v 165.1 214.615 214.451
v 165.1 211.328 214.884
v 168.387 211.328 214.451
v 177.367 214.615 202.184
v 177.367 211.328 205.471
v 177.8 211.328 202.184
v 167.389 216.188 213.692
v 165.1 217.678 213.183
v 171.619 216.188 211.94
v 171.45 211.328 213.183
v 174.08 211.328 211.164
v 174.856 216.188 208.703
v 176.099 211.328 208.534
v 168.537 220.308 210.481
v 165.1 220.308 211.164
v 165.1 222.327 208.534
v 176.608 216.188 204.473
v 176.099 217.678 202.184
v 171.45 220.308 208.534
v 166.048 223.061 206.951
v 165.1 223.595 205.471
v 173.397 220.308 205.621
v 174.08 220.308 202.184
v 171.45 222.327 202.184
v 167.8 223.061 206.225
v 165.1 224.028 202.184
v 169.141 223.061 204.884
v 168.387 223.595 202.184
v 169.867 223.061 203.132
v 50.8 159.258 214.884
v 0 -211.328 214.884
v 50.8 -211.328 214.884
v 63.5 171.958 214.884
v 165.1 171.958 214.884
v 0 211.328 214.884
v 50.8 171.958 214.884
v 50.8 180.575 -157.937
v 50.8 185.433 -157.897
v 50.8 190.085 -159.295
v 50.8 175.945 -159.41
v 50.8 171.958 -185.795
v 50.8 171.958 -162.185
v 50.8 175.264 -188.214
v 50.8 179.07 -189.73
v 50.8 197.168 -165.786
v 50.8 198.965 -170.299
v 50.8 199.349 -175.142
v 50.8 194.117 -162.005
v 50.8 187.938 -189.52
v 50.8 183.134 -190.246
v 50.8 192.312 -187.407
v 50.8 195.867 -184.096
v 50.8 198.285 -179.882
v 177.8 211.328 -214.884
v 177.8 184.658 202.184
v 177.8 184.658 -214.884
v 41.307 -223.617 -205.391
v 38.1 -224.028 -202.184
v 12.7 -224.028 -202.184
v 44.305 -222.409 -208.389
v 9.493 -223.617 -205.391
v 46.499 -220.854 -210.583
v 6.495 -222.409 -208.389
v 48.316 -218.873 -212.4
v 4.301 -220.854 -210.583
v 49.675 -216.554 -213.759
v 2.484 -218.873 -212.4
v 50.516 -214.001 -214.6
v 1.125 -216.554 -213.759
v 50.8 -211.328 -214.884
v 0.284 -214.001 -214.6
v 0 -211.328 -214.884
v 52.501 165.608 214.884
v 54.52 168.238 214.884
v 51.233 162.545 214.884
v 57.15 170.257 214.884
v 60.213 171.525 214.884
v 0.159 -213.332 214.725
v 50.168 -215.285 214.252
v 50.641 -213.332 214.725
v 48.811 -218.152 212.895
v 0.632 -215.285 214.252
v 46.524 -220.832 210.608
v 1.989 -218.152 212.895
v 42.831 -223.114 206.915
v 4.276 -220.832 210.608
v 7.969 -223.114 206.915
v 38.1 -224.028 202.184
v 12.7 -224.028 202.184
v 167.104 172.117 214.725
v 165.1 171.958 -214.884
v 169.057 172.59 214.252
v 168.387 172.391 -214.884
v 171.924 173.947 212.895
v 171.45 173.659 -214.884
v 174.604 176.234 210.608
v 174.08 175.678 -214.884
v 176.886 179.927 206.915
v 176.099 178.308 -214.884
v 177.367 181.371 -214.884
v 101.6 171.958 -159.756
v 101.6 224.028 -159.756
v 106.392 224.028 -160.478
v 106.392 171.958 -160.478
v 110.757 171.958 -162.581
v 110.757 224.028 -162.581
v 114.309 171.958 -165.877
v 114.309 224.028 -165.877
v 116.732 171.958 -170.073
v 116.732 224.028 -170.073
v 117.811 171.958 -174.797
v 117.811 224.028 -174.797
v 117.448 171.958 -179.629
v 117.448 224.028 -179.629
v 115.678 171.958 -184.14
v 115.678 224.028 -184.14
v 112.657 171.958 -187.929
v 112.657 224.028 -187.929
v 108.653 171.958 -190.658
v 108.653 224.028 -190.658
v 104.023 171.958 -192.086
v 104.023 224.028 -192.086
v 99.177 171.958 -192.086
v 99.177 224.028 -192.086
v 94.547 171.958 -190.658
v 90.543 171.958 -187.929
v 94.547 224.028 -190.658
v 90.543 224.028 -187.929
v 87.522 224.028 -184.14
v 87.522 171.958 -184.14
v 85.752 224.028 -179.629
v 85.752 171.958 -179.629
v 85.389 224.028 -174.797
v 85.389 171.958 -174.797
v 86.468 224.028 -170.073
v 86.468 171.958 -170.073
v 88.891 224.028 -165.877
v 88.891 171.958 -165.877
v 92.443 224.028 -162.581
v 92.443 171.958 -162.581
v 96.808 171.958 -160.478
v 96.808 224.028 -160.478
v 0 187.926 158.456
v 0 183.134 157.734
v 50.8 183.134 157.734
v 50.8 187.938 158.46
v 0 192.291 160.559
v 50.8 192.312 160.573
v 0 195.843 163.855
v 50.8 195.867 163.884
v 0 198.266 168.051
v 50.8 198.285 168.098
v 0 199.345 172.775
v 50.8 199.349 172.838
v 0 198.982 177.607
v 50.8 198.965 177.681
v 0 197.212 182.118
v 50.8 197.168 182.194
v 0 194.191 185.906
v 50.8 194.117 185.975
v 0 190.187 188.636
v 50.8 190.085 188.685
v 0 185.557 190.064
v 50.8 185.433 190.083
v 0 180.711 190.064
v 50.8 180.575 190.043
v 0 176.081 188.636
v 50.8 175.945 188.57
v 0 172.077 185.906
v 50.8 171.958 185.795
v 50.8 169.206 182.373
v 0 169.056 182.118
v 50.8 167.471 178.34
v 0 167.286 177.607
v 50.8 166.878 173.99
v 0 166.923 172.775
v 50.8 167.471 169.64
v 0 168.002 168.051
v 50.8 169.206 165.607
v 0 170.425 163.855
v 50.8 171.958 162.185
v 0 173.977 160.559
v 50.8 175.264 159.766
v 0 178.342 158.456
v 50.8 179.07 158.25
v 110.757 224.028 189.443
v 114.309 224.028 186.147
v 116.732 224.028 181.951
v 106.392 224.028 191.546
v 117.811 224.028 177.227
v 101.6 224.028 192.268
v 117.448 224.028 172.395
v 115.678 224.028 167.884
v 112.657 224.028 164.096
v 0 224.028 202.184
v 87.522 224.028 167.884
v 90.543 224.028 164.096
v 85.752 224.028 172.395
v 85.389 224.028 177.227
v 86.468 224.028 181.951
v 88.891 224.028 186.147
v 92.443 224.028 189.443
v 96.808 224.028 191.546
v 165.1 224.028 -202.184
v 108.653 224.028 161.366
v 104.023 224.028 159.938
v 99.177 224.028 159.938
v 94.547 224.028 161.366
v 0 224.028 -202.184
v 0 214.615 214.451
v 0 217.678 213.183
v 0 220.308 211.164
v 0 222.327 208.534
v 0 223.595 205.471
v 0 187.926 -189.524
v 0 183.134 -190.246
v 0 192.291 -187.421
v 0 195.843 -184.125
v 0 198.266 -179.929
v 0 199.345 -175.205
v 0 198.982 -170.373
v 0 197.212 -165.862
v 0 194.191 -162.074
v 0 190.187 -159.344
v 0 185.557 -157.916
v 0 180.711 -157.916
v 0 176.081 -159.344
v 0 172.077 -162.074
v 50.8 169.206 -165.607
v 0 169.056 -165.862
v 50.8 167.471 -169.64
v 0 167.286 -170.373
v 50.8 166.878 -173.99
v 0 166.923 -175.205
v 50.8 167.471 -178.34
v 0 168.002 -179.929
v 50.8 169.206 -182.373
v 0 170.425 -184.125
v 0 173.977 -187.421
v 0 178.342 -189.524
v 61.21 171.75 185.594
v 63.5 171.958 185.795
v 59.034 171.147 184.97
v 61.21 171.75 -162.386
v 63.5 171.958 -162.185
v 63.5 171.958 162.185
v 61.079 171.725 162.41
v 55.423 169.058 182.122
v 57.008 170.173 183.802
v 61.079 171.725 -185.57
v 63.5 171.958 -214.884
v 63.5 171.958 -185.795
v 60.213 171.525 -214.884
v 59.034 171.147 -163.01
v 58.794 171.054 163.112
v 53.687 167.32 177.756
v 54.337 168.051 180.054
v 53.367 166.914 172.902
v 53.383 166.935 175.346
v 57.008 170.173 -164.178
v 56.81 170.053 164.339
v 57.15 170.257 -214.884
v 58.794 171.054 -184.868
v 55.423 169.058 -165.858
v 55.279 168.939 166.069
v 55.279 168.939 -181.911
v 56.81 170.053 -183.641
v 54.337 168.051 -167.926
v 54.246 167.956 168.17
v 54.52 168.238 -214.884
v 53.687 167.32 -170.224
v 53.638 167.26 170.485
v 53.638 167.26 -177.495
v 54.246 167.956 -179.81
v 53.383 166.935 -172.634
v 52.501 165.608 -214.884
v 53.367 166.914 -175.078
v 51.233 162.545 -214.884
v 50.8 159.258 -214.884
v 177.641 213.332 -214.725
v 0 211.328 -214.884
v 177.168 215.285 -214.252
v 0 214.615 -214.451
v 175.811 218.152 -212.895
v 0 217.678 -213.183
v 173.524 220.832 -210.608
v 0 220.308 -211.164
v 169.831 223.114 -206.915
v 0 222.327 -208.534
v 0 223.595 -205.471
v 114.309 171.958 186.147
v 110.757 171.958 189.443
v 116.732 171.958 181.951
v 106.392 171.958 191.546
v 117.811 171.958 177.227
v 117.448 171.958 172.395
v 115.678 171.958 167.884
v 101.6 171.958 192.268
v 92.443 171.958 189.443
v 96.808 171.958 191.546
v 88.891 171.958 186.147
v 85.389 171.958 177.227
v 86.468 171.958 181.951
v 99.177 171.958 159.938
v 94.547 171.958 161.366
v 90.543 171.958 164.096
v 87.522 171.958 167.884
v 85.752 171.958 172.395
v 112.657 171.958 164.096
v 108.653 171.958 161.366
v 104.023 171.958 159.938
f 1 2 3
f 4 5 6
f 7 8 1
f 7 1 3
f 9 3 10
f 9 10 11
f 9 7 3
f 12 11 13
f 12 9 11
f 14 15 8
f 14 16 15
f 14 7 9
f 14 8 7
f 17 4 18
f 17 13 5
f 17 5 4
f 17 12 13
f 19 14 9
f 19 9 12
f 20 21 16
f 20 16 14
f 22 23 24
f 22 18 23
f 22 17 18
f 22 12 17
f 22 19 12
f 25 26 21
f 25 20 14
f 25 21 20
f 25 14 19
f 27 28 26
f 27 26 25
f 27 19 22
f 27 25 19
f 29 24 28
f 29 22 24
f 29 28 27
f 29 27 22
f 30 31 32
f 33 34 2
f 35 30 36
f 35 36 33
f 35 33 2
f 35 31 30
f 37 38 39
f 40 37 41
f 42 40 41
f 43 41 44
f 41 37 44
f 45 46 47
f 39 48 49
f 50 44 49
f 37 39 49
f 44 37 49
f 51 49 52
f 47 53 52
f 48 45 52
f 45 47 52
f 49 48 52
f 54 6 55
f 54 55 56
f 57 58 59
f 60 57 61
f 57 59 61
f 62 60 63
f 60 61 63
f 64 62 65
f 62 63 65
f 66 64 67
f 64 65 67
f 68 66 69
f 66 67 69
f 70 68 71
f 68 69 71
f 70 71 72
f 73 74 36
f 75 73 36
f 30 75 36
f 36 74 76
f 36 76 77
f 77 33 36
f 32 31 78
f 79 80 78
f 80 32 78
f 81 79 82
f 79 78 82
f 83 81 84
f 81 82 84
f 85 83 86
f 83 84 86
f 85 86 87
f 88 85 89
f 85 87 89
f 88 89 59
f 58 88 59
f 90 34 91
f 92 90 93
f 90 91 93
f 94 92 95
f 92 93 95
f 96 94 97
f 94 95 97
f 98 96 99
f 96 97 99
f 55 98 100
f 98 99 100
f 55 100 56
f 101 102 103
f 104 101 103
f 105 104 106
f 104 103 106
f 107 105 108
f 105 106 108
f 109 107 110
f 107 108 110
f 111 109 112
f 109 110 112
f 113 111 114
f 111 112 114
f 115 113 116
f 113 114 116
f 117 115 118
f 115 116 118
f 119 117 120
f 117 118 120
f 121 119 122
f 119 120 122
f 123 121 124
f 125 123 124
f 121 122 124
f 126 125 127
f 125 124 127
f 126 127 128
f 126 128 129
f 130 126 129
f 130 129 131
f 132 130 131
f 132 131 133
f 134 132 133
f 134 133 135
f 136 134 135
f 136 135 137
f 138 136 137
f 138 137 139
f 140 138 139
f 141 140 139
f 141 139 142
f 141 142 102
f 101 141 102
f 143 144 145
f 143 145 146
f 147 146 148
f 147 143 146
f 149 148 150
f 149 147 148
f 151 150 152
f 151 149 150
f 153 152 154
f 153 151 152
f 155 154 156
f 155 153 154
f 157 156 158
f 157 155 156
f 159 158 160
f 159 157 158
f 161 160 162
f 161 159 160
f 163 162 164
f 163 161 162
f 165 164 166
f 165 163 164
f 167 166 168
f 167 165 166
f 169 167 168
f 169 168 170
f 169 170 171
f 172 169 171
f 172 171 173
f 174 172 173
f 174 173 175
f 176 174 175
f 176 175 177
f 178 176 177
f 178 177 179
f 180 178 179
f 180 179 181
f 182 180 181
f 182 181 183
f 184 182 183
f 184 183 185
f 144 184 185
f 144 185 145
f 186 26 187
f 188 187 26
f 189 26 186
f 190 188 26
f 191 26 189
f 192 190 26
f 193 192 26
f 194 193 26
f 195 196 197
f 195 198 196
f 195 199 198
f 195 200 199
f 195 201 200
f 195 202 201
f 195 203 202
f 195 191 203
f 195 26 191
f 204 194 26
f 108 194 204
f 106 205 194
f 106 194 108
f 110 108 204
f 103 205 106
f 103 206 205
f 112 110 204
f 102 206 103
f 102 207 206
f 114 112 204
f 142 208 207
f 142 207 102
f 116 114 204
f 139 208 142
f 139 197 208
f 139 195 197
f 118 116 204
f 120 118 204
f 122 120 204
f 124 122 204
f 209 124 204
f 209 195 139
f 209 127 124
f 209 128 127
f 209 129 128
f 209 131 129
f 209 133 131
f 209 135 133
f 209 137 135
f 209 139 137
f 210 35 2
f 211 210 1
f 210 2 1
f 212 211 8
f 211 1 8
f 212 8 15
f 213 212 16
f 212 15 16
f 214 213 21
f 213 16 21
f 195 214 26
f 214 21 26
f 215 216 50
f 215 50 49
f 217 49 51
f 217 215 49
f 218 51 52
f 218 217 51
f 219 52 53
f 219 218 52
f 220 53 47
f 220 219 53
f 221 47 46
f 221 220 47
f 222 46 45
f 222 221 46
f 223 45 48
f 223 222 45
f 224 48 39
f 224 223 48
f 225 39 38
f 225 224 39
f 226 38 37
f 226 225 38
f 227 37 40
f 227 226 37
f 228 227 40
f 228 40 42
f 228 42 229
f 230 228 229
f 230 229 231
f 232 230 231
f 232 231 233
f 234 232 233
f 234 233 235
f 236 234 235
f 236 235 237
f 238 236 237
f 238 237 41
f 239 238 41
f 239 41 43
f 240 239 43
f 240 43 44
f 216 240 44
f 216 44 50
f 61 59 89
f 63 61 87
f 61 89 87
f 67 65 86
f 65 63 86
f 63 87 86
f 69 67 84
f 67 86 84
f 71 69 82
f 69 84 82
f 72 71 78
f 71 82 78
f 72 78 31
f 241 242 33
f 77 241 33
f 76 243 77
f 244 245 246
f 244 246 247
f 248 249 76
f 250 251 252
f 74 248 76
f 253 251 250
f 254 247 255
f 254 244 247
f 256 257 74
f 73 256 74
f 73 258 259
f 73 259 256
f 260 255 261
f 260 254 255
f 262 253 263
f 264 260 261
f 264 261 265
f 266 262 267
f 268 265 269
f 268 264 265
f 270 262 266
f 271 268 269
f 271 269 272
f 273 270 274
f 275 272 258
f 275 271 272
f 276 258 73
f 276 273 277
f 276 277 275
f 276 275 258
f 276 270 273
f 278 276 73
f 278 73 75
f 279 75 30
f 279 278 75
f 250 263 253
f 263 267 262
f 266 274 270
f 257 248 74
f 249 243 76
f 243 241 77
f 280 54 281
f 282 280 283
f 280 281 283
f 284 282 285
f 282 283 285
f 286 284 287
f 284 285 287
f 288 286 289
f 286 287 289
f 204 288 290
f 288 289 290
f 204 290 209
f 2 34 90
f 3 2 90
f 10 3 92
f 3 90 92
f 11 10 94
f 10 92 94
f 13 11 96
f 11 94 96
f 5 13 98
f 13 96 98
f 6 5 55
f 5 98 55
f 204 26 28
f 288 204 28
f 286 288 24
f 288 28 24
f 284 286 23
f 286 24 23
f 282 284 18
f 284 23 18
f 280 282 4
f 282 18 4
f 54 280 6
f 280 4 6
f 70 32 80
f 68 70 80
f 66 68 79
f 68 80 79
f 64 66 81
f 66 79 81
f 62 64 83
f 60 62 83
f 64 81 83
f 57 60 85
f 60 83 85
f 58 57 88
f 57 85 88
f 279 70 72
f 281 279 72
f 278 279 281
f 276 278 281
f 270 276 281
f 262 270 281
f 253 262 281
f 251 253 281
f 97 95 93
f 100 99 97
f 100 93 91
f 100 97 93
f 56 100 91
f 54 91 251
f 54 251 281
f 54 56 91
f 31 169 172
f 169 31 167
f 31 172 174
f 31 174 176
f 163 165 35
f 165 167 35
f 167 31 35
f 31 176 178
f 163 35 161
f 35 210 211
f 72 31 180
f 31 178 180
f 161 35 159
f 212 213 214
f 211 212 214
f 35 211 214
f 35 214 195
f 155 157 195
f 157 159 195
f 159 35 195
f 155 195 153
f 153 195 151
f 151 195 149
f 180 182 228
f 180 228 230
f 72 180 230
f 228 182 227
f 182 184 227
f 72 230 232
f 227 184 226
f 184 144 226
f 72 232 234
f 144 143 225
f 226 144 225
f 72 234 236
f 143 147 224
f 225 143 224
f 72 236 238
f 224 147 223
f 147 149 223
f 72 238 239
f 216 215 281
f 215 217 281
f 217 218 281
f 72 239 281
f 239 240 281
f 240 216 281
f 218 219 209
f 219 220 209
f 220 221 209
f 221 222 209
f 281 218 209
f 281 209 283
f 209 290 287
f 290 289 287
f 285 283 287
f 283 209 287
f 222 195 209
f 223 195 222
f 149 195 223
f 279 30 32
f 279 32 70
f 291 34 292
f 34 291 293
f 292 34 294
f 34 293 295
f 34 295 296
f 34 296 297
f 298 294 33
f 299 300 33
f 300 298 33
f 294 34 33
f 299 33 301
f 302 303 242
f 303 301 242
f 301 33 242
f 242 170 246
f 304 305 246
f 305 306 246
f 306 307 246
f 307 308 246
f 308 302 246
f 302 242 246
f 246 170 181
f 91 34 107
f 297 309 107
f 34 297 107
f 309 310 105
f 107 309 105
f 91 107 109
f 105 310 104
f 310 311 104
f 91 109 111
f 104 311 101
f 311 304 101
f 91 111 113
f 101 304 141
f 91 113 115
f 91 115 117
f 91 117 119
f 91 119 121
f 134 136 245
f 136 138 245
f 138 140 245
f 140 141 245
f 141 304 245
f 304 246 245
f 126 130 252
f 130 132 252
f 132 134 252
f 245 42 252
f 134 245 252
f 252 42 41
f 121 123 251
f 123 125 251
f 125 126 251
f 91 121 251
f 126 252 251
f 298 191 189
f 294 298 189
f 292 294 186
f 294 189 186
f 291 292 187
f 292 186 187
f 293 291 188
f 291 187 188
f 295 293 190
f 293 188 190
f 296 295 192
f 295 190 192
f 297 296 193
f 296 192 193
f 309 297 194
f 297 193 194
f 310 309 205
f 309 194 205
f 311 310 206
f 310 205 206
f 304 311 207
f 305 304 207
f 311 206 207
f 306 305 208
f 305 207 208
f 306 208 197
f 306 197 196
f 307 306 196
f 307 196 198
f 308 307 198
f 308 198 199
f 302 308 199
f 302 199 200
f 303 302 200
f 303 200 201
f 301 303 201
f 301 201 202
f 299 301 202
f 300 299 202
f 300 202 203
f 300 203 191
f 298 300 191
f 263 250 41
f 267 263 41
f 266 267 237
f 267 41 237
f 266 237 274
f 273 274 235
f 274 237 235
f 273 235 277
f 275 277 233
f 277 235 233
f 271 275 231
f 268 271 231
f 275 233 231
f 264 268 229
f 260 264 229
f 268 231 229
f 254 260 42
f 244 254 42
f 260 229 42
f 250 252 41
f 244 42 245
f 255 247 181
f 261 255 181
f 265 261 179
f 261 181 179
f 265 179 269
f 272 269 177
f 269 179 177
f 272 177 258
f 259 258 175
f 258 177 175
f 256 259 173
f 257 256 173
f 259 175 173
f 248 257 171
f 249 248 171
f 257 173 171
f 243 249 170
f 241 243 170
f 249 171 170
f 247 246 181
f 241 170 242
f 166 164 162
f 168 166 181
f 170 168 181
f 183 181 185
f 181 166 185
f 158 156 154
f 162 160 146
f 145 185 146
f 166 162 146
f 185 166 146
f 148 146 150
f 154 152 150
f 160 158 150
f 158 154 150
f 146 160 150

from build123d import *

# Parameters (mm, degrees)
SKETCH1_W           = 429.768
SKETCH1_H           = 448.056
SKETCH1_R           = 16.256
BOSS_EXTRUDE1_DEPTH = 50.8
SKETCH2_W           = 429.768
SKETCH2_H           = 52.07
BOSS_EXTRUDE2_DEPTH = 127
SKETCH3_R           = 16.256
CUT_EXTRUDE1_DEPTH  = 76.2
FILLET1_R           = 12.7


with BuildPart() as part:
    # Sketch1 → Boss-Extrude1 (new body)
    with BuildSketch(Plane(origin=(0, 0, 0), x_dir=(0, 0, -1), z_dir=(1, 0, 0))):
        Rectangle(SKETCH1_W, SKETCH1_H)
        with Locations((-173.99, 183.134)):
            Circle(SKETCH1_R, mode=Mode.SUBTRACT)
        with Locations((173.99, 183.134)):
            Circle(SKETCH1_R, mode=Mode.SUBTRACT)
    extrude(amount=BOSS_EXTRUDE1_DEPTH)

    # Sketch2 → Boss-Extrude2 (add)
    with BuildSketch(Plane(origin=(50.8, 0, 0), x_dir=(0, 0, -1), z_dir=(1, 0, 0))):
        with Locations((0, 197.993)):
            Rectangle(SKETCH2_W, SKETCH2_H)
    extrude(amount=BOSS_EXTRUDE2_DEPTH)

    # Sketch3 → Cut-Extrude1 (cut)
    with BuildSketch(Plane(origin=(0, 224.028, 0), x_dir=(1, 0, 0), z_dir=(0, 1, 0))):
        with Locations(Location((101.6, 176.012040492, 0), (0, 0, 270))):
            Circle(SKETCH3_R)
        with Locations(Location((101.6, -176.012040492, 0), (0, 0, 270))):
            Circle(SKETCH3_R)
    extrude(amount=-CUT_EXTRUDE1_DEPTH, mode=Mode.SUBTRACT)

    # Fillet1
    # the kernel refuses this fillet: 12.7 mm, written as the material it adds along each edge
    with BuildSketch(Plane(origin=(50.8, 171.958, -214.884), x_dir=(0, -1, 0), z_dir=(0, 0, 1))) as fillet1_piece_1_section:
        with BuildLine():
            CenterArc((FILLET1_R, FILLET1_R), FILLET1_R, 180, 90)
            Line((0, FILLET1_R), (0, 0))
            Line((0, 0), (FILLET1_R, 0))
        make_face()
    fillet1_piece_1 = extrude(amount=60.839146761, mode=Mode.PRIVATE)
    fillet1_piece_1 = fillet1_piece_1 - Plane(origin=(53.390848129, 183.134, -173.99), x_dir=(0, 0, -1), z_dir=(-1, 0, 0)) * Cylinder(16.256, 173, mode=Mode.PRIVATE)
    add(fillet1_piece_1)
    with BuildSketch(Plane(origin=(50.8, 171.958, -193.935146761), x_dir=(0, -1, 0), z_dir=(0, 0, 1))) as fillet1_piece_2_section:
        with BuildLine():
            CenterArc((FILLET1_R, FILLET1_R), FILLET1_R, 180, 90)
            Line((0, FILLET1_R), (0, 0))
            Line((0, 0), (FILLET1_R, 0))
        make_face()
    fillet1_piece_2 = extrude(amount=387.870293522, mode=Mode.PRIVATE)
    fillet1_piece_2 = fillet1_piece_2 - Plane(origin=(53.573862422, 183.134, 173.99), x_dir=(0, 0, -1), z_dir=(-1, 0, 0)) * Cylinder(16.256, 827, mode=Mode.PRIVATE)
    fillet1_piece_2 = fillet1_piece_2 - Plane(origin=(53.573862422, 183.134, -173.99), x_dir=(0, 0, -1), z_dir=(-1, 0, 0)) * Cylinder(16.256, 827, mode=Mode.PRIVATE)
    add(fillet1_piece_2)
    with BuildSketch(Plane(origin=(50.8, 171.958, 154.044853239), x_dir=(0, -1, 0), z_dir=(0, 0, 1))) as fillet1_piece_3_section:
        with BuildLine():
            CenterArc((FILLET1_R, FILLET1_R), FILLET1_R, 180, 90)
            Line((0, FILLET1_R), (0, 0))
            Line((0, 0), (FILLET1_R, 0))
        make_face()
    fillet1_piece_3 = extrude(amount=60.839146761, mode=Mode.PRIVATE)
    fillet1_piece_3 = fillet1_piece_3 - Plane(origin=(53.390848027, 183.134, 173.99), x_dir=(0, 0, -1), z_dir=(-1, 0, 0)) * Cylinder(16.256, 173, mode=Mode.PRIVATE)
    add(fillet1_piece_3)
    # the kernel refuses this fillet: 12.7 mm, written as the material it takes off along each edge
    with BuildSketch(Plane(origin=(165.1, 211.328, 202.184), x_dir=(1, 0, 0), z_dir=(0, 1, 0))) as fillet1_2_piece_1_section:
        Polygon((0, 0), (FILLET1_R * 1.02, 0), (FILLET1_R * 1.02, -FILLET1_R * 1.02), (0, -FILLET1_R * 1.02), align=None)
    fillet1_2_piece_1 = extrude(amount=FILLET1_R * 1.02, mode=Mode.PRIVATE)
    fillet1_2_piece_1 = fillet1_2_piece_1 - Plane(origin=(165.1, 211.328, 202.184), x_dir=(-0.7071067811865475, 0, -0.7071067811865475), z_dir=(0, 1, 0)) * Sphere(FILLET1_R, mode=Mode.PRIVATE)
    add(fillet1_2_piece_1, mode=Mode.SUBTRACT)
    with BuildSketch(Plane(origin=(-31.75, -224.028, -214.884), x_dir=(0, 0, 1), z_dir=(1, 0, 0))) as fillet1_2_piece_2:
        with BuildLine():
            CenterArc((FILLET1_R, -FILLET1_R), FILLET1_R, 90, 90)
            Line((0, -FILLET1_R), (0, 0))
            Line((0, 0), (FILLET1_R, 0))
        make_face()
    extrude(amount=114.3, mode=Mode.SUBTRACT)
    with BuildSketch(Plane(origin=(-31.75, -224.028, 214.884), x_dir=(0, 0, -1), z_dir=(1, 0, 0))) as fillet1_2_piece_3:
        with BuildLine():
            CenterArc((FILLET1_R, FILLET1_R), FILLET1_R, 180, 90)
            Line((0, FILLET1_R), (0, 0))
            Line((0, 0), (FILLET1_R, 0))
        make_face()
    extrude(amount=114.3, mode=Mode.SUBTRACT)
    with BuildSketch(Plane(origin=(165.1, 224.028, 214.884), x_dir=(0, 0, -1), z_dir=(-1, 0, 0))) as fillet1_2_piece_4:
        with BuildLine():
            CenterArc((FILLET1_R, FILLET1_R), FILLET1_R, 180, 90)
            Line((0, FILLET1_R), (0, 0))
            Line((0, 0), (FILLET1_R, 0))
        make_face()
    extrude(amount=196.85, mode=Mode.SUBTRACT)
    with BuildSketch(Plane(origin=(-31.75, 224.028, -214.884), x_dir=(0, 0, 1), z_dir=(1, 0, 0))) as fillet1_2_piece_5:
        with BuildLine():
            CenterArc((FILLET1_R, FILLET1_R), FILLET1_R, 180, 90)
            Line((0, FILLET1_R), (0, 0))
            Line((0, 0), (FILLET1_R, 0))
        make_face()
    extrude(amount=241.3, mode=Mode.SUBTRACT)
    with BuildSketch(Plane(origin=(177.8, 140.208, 214.884), x_dir=(0, 0, -1), z_dir=(0, 1, 0))) as fillet1_2_piece_6:
        with BuildLine():
            CenterArc((FILLET1_R, FILLET1_R), FILLET1_R, 180, 90)
            Line((0, FILLET1_R), (0, 0))
            Line((0, 0), (FILLET1_R, 0))
        make_face()
    extrude(amount=71.12, mode=Mode.SUBTRACT)
    with BuildSketch(Plane(origin=(177.8, 171.958, -246.634), x_dir=(-1, 0, 0), z_dir=(0, 0, 1)), Plane(origin=(0, -224.028, 246.634), x_dir=(1, 0, 0), z_dir=(0, 0, -1))) as fillet1_2_piece_7:
        with BuildLine():
            CenterArc((FILLET1_R, -FILLET1_R), FILLET1_R, 90, 90)
            Line((0, -FILLET1_R), (0, 0))
            Line((0, 0), (FILLET1_R, 0))
        make_face()
    extrude(amount=493.268, mode=Mode.SUBTRACT)
    with BuildSketch(Plane(origin=(177.8, 224.028, 202.184), x_dir=(-1, 0, 0), z_dir=(0, 0, -1))) as fillet1_2_piece_8:
        with BuildLine():
            CenterArc((FILLET1_R, -FILLET1_R), FILLET1_R, 90, 90)
            Line((0, -FILLET1_R), (0, 0))
            Line((0, 0), (FILLET1_R, 0))
        make_face()
    extrude(amount=448.818, mode=Mode.SUBTRACT)
    with BuildSketch(Plane(origin=(50.8, -224.028, 246.634), x_dir=(-1, 0, 0), z_dir=(0, 0, -1))) as fillet1_2_piece_9:
        with BuildLine():
            CenterArc((FILLET1_R, FILLET1_R), FILLET1_R, 180, 90)
            Line((0, FILLET1_R), (0, 0))
            Line((0, 0), (FILLET1_R, 0))
        make_face()
    extrude(amount=493.268, mode=Mode.SUBTRACT)


solid = part.part
